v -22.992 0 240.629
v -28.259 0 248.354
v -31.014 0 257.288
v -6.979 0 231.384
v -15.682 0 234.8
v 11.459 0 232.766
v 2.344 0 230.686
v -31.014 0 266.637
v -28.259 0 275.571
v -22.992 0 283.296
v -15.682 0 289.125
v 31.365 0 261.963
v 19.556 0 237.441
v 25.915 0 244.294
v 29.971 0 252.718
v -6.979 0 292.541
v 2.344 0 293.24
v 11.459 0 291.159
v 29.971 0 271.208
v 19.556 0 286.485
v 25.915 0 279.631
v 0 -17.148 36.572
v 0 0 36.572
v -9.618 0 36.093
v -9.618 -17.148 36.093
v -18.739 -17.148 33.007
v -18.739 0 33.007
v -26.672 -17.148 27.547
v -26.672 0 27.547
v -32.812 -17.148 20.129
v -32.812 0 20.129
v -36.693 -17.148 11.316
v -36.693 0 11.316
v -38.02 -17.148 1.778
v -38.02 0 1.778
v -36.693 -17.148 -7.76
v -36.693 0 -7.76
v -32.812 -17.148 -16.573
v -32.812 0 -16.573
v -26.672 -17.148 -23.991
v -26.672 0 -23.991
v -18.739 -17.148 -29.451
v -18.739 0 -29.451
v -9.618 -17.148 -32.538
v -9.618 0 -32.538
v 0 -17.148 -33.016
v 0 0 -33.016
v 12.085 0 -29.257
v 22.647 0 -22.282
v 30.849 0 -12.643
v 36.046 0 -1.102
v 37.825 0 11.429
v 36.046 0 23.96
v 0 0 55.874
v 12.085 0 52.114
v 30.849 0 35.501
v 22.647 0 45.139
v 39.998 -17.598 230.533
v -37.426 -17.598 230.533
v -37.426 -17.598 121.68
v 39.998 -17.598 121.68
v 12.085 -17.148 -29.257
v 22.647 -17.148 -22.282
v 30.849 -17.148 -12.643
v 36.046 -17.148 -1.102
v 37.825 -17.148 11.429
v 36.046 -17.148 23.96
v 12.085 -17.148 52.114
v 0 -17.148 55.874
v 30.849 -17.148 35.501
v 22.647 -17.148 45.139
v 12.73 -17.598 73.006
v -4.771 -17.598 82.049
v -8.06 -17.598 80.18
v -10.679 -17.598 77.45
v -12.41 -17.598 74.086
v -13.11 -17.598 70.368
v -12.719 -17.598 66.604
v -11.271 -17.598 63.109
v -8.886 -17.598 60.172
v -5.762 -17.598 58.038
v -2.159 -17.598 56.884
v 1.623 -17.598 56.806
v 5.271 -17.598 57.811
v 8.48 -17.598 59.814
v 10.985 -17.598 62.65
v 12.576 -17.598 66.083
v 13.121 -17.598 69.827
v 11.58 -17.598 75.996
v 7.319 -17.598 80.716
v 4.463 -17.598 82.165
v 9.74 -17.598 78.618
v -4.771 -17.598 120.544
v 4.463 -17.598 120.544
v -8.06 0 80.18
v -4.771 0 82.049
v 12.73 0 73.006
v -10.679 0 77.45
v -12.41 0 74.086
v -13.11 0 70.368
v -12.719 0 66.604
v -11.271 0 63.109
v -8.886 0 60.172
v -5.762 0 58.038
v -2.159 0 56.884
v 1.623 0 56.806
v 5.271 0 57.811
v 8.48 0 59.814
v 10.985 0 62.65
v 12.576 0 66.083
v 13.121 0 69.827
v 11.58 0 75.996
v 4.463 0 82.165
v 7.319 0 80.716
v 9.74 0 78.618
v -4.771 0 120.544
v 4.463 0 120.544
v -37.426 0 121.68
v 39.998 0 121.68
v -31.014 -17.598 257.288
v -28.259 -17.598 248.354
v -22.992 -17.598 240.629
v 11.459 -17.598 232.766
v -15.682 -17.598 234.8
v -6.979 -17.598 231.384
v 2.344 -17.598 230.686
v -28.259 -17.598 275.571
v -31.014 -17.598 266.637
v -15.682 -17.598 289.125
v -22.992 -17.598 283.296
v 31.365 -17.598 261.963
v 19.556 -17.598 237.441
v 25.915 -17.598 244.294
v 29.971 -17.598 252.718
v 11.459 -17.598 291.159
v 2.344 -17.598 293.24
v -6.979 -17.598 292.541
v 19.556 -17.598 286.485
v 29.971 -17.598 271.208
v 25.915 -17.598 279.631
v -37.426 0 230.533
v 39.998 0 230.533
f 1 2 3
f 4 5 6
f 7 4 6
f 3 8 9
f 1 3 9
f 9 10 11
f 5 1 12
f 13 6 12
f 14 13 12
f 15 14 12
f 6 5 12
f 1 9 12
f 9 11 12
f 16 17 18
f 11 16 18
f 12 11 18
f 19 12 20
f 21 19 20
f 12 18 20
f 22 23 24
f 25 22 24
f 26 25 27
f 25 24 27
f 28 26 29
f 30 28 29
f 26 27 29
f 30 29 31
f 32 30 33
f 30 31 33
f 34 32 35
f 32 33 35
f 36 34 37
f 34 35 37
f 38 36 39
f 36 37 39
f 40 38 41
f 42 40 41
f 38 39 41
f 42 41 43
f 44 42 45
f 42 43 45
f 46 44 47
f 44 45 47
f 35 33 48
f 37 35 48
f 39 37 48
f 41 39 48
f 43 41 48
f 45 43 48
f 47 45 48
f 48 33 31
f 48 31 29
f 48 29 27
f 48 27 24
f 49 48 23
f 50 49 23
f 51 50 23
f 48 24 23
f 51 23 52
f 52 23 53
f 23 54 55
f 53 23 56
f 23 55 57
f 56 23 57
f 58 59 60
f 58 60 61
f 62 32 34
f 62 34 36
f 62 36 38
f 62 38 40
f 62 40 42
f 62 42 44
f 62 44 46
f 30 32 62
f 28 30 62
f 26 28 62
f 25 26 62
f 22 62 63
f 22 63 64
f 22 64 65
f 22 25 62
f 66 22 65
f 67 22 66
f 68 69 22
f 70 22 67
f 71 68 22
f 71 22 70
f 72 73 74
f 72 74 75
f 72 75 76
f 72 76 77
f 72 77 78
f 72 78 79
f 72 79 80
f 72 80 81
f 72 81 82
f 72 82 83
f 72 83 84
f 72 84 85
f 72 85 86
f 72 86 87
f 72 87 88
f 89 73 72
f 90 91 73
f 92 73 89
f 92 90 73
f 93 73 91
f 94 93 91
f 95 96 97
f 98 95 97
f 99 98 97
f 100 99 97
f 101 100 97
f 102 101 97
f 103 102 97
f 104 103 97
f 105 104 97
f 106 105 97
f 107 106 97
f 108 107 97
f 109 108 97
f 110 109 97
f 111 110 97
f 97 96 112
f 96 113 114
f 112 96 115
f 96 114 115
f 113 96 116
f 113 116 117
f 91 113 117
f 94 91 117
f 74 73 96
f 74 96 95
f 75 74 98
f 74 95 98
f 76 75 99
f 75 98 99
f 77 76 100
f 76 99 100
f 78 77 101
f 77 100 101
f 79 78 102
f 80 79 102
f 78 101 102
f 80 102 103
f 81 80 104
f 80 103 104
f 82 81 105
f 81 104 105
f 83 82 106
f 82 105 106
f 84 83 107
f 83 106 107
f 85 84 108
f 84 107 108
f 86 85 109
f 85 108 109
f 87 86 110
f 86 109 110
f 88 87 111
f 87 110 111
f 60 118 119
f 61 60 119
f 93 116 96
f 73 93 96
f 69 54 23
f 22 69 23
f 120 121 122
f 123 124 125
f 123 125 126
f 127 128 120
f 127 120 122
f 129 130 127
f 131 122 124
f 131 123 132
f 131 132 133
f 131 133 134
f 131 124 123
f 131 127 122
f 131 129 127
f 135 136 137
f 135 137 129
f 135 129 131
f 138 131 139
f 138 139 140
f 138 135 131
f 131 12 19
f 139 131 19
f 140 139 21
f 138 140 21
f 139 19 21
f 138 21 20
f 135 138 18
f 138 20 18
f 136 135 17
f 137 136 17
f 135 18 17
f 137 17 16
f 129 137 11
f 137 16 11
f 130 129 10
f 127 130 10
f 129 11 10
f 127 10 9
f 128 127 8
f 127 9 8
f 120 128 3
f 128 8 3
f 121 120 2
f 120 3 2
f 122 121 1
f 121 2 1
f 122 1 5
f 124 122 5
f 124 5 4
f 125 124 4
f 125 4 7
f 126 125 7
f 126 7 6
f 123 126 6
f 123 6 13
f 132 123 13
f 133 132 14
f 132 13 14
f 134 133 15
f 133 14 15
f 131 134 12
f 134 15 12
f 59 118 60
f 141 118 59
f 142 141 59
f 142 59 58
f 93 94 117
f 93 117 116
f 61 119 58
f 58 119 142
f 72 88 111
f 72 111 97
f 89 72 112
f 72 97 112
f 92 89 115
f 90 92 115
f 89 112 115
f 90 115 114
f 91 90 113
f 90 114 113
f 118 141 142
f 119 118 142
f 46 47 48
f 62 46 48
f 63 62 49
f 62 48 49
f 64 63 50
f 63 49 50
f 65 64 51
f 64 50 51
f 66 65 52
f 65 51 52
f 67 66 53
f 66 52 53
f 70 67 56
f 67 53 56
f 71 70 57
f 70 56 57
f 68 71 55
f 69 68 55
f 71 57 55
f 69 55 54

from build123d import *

# Parameters (mm, degrees)
F1_DEPTH = 17.14836
F3_W     = 77.4238
F3_H     = 108.853265
F3_R     = 31.364815
F4_DEPTH = 17.59801


with BuildPart() as f1:
    # F0 (on Front) → F1 (new body)
    with BuildSketch(Plane.XZ):
        with BuildLine():
            Line((0, 55.873934), (0, 36.572032))
            ThreePointArc((0, 36.572032), (-38.020248, 1.777809), (0, -33.016413))
            ThreePointArc((0, -33.016413), (37.824576, 11.42876), (0, 55.873934))
        make_face()
    extrude(amount=F1_DEPTH)


with BuildPart() as f4:
    # F2 (on Front) + F3 (on Front) → F4 (new body)
    with BuildSketch(Plane.XZ):
        with BuildLine():
            ThreePointArc((-4.771045, 82.049359), (-7.401353, 58.992256), (13.121014, 69.826506))
            ThreePointArc((13.121014, 69.826506), (10.740433, 77.363356), (4.462522, 82.165344))
            Line((4.462522, 82.165344), (4.462522, 69.627687))
            Line((4.462522, 69.627687), (-4.771045, 69.627687))
            Line((-4.771045, 69.627687), (-4.771045, 82.049359))
        make_face()
        with BuildLine():
            ThreePointArc((-4.771045, 82.049359), (-0.164802, 82.946485), (4.462522, 82.165344))
            Line((4.462522, 82.165344), (4.462522, 120.54421))
            Line((4.462522, 120.54421), (-4.771045, 120.54421))
            Line((-4.771045, 120.54421), (-4.771045, 82.049359))
        make_face()
        with BuildLine():
            Line((4.462522, 69.627687), (4.462522, 82.165344))
            ThreePointArc((4.462522, 82.165344), (-0.164802, 82.946485), (-4.771045, 82.049359))
            Line((-4.771045, 82.049359), (-4.771045, 69.627687))
            Line((-4.771045, 69.627687), (4.462522, 69.627687))
        make_face()
    with BuildSketch(Plane.XZ):
        with Locations((1.285942, 176.106609)):
            Rectangle(F3_W, F3_H)
        with Locations((0, 261.962712)):
            Circle(F3_R)
    extrude(amount=F4_DEPTH)


solid = Compound([f1.part, f4.part])
